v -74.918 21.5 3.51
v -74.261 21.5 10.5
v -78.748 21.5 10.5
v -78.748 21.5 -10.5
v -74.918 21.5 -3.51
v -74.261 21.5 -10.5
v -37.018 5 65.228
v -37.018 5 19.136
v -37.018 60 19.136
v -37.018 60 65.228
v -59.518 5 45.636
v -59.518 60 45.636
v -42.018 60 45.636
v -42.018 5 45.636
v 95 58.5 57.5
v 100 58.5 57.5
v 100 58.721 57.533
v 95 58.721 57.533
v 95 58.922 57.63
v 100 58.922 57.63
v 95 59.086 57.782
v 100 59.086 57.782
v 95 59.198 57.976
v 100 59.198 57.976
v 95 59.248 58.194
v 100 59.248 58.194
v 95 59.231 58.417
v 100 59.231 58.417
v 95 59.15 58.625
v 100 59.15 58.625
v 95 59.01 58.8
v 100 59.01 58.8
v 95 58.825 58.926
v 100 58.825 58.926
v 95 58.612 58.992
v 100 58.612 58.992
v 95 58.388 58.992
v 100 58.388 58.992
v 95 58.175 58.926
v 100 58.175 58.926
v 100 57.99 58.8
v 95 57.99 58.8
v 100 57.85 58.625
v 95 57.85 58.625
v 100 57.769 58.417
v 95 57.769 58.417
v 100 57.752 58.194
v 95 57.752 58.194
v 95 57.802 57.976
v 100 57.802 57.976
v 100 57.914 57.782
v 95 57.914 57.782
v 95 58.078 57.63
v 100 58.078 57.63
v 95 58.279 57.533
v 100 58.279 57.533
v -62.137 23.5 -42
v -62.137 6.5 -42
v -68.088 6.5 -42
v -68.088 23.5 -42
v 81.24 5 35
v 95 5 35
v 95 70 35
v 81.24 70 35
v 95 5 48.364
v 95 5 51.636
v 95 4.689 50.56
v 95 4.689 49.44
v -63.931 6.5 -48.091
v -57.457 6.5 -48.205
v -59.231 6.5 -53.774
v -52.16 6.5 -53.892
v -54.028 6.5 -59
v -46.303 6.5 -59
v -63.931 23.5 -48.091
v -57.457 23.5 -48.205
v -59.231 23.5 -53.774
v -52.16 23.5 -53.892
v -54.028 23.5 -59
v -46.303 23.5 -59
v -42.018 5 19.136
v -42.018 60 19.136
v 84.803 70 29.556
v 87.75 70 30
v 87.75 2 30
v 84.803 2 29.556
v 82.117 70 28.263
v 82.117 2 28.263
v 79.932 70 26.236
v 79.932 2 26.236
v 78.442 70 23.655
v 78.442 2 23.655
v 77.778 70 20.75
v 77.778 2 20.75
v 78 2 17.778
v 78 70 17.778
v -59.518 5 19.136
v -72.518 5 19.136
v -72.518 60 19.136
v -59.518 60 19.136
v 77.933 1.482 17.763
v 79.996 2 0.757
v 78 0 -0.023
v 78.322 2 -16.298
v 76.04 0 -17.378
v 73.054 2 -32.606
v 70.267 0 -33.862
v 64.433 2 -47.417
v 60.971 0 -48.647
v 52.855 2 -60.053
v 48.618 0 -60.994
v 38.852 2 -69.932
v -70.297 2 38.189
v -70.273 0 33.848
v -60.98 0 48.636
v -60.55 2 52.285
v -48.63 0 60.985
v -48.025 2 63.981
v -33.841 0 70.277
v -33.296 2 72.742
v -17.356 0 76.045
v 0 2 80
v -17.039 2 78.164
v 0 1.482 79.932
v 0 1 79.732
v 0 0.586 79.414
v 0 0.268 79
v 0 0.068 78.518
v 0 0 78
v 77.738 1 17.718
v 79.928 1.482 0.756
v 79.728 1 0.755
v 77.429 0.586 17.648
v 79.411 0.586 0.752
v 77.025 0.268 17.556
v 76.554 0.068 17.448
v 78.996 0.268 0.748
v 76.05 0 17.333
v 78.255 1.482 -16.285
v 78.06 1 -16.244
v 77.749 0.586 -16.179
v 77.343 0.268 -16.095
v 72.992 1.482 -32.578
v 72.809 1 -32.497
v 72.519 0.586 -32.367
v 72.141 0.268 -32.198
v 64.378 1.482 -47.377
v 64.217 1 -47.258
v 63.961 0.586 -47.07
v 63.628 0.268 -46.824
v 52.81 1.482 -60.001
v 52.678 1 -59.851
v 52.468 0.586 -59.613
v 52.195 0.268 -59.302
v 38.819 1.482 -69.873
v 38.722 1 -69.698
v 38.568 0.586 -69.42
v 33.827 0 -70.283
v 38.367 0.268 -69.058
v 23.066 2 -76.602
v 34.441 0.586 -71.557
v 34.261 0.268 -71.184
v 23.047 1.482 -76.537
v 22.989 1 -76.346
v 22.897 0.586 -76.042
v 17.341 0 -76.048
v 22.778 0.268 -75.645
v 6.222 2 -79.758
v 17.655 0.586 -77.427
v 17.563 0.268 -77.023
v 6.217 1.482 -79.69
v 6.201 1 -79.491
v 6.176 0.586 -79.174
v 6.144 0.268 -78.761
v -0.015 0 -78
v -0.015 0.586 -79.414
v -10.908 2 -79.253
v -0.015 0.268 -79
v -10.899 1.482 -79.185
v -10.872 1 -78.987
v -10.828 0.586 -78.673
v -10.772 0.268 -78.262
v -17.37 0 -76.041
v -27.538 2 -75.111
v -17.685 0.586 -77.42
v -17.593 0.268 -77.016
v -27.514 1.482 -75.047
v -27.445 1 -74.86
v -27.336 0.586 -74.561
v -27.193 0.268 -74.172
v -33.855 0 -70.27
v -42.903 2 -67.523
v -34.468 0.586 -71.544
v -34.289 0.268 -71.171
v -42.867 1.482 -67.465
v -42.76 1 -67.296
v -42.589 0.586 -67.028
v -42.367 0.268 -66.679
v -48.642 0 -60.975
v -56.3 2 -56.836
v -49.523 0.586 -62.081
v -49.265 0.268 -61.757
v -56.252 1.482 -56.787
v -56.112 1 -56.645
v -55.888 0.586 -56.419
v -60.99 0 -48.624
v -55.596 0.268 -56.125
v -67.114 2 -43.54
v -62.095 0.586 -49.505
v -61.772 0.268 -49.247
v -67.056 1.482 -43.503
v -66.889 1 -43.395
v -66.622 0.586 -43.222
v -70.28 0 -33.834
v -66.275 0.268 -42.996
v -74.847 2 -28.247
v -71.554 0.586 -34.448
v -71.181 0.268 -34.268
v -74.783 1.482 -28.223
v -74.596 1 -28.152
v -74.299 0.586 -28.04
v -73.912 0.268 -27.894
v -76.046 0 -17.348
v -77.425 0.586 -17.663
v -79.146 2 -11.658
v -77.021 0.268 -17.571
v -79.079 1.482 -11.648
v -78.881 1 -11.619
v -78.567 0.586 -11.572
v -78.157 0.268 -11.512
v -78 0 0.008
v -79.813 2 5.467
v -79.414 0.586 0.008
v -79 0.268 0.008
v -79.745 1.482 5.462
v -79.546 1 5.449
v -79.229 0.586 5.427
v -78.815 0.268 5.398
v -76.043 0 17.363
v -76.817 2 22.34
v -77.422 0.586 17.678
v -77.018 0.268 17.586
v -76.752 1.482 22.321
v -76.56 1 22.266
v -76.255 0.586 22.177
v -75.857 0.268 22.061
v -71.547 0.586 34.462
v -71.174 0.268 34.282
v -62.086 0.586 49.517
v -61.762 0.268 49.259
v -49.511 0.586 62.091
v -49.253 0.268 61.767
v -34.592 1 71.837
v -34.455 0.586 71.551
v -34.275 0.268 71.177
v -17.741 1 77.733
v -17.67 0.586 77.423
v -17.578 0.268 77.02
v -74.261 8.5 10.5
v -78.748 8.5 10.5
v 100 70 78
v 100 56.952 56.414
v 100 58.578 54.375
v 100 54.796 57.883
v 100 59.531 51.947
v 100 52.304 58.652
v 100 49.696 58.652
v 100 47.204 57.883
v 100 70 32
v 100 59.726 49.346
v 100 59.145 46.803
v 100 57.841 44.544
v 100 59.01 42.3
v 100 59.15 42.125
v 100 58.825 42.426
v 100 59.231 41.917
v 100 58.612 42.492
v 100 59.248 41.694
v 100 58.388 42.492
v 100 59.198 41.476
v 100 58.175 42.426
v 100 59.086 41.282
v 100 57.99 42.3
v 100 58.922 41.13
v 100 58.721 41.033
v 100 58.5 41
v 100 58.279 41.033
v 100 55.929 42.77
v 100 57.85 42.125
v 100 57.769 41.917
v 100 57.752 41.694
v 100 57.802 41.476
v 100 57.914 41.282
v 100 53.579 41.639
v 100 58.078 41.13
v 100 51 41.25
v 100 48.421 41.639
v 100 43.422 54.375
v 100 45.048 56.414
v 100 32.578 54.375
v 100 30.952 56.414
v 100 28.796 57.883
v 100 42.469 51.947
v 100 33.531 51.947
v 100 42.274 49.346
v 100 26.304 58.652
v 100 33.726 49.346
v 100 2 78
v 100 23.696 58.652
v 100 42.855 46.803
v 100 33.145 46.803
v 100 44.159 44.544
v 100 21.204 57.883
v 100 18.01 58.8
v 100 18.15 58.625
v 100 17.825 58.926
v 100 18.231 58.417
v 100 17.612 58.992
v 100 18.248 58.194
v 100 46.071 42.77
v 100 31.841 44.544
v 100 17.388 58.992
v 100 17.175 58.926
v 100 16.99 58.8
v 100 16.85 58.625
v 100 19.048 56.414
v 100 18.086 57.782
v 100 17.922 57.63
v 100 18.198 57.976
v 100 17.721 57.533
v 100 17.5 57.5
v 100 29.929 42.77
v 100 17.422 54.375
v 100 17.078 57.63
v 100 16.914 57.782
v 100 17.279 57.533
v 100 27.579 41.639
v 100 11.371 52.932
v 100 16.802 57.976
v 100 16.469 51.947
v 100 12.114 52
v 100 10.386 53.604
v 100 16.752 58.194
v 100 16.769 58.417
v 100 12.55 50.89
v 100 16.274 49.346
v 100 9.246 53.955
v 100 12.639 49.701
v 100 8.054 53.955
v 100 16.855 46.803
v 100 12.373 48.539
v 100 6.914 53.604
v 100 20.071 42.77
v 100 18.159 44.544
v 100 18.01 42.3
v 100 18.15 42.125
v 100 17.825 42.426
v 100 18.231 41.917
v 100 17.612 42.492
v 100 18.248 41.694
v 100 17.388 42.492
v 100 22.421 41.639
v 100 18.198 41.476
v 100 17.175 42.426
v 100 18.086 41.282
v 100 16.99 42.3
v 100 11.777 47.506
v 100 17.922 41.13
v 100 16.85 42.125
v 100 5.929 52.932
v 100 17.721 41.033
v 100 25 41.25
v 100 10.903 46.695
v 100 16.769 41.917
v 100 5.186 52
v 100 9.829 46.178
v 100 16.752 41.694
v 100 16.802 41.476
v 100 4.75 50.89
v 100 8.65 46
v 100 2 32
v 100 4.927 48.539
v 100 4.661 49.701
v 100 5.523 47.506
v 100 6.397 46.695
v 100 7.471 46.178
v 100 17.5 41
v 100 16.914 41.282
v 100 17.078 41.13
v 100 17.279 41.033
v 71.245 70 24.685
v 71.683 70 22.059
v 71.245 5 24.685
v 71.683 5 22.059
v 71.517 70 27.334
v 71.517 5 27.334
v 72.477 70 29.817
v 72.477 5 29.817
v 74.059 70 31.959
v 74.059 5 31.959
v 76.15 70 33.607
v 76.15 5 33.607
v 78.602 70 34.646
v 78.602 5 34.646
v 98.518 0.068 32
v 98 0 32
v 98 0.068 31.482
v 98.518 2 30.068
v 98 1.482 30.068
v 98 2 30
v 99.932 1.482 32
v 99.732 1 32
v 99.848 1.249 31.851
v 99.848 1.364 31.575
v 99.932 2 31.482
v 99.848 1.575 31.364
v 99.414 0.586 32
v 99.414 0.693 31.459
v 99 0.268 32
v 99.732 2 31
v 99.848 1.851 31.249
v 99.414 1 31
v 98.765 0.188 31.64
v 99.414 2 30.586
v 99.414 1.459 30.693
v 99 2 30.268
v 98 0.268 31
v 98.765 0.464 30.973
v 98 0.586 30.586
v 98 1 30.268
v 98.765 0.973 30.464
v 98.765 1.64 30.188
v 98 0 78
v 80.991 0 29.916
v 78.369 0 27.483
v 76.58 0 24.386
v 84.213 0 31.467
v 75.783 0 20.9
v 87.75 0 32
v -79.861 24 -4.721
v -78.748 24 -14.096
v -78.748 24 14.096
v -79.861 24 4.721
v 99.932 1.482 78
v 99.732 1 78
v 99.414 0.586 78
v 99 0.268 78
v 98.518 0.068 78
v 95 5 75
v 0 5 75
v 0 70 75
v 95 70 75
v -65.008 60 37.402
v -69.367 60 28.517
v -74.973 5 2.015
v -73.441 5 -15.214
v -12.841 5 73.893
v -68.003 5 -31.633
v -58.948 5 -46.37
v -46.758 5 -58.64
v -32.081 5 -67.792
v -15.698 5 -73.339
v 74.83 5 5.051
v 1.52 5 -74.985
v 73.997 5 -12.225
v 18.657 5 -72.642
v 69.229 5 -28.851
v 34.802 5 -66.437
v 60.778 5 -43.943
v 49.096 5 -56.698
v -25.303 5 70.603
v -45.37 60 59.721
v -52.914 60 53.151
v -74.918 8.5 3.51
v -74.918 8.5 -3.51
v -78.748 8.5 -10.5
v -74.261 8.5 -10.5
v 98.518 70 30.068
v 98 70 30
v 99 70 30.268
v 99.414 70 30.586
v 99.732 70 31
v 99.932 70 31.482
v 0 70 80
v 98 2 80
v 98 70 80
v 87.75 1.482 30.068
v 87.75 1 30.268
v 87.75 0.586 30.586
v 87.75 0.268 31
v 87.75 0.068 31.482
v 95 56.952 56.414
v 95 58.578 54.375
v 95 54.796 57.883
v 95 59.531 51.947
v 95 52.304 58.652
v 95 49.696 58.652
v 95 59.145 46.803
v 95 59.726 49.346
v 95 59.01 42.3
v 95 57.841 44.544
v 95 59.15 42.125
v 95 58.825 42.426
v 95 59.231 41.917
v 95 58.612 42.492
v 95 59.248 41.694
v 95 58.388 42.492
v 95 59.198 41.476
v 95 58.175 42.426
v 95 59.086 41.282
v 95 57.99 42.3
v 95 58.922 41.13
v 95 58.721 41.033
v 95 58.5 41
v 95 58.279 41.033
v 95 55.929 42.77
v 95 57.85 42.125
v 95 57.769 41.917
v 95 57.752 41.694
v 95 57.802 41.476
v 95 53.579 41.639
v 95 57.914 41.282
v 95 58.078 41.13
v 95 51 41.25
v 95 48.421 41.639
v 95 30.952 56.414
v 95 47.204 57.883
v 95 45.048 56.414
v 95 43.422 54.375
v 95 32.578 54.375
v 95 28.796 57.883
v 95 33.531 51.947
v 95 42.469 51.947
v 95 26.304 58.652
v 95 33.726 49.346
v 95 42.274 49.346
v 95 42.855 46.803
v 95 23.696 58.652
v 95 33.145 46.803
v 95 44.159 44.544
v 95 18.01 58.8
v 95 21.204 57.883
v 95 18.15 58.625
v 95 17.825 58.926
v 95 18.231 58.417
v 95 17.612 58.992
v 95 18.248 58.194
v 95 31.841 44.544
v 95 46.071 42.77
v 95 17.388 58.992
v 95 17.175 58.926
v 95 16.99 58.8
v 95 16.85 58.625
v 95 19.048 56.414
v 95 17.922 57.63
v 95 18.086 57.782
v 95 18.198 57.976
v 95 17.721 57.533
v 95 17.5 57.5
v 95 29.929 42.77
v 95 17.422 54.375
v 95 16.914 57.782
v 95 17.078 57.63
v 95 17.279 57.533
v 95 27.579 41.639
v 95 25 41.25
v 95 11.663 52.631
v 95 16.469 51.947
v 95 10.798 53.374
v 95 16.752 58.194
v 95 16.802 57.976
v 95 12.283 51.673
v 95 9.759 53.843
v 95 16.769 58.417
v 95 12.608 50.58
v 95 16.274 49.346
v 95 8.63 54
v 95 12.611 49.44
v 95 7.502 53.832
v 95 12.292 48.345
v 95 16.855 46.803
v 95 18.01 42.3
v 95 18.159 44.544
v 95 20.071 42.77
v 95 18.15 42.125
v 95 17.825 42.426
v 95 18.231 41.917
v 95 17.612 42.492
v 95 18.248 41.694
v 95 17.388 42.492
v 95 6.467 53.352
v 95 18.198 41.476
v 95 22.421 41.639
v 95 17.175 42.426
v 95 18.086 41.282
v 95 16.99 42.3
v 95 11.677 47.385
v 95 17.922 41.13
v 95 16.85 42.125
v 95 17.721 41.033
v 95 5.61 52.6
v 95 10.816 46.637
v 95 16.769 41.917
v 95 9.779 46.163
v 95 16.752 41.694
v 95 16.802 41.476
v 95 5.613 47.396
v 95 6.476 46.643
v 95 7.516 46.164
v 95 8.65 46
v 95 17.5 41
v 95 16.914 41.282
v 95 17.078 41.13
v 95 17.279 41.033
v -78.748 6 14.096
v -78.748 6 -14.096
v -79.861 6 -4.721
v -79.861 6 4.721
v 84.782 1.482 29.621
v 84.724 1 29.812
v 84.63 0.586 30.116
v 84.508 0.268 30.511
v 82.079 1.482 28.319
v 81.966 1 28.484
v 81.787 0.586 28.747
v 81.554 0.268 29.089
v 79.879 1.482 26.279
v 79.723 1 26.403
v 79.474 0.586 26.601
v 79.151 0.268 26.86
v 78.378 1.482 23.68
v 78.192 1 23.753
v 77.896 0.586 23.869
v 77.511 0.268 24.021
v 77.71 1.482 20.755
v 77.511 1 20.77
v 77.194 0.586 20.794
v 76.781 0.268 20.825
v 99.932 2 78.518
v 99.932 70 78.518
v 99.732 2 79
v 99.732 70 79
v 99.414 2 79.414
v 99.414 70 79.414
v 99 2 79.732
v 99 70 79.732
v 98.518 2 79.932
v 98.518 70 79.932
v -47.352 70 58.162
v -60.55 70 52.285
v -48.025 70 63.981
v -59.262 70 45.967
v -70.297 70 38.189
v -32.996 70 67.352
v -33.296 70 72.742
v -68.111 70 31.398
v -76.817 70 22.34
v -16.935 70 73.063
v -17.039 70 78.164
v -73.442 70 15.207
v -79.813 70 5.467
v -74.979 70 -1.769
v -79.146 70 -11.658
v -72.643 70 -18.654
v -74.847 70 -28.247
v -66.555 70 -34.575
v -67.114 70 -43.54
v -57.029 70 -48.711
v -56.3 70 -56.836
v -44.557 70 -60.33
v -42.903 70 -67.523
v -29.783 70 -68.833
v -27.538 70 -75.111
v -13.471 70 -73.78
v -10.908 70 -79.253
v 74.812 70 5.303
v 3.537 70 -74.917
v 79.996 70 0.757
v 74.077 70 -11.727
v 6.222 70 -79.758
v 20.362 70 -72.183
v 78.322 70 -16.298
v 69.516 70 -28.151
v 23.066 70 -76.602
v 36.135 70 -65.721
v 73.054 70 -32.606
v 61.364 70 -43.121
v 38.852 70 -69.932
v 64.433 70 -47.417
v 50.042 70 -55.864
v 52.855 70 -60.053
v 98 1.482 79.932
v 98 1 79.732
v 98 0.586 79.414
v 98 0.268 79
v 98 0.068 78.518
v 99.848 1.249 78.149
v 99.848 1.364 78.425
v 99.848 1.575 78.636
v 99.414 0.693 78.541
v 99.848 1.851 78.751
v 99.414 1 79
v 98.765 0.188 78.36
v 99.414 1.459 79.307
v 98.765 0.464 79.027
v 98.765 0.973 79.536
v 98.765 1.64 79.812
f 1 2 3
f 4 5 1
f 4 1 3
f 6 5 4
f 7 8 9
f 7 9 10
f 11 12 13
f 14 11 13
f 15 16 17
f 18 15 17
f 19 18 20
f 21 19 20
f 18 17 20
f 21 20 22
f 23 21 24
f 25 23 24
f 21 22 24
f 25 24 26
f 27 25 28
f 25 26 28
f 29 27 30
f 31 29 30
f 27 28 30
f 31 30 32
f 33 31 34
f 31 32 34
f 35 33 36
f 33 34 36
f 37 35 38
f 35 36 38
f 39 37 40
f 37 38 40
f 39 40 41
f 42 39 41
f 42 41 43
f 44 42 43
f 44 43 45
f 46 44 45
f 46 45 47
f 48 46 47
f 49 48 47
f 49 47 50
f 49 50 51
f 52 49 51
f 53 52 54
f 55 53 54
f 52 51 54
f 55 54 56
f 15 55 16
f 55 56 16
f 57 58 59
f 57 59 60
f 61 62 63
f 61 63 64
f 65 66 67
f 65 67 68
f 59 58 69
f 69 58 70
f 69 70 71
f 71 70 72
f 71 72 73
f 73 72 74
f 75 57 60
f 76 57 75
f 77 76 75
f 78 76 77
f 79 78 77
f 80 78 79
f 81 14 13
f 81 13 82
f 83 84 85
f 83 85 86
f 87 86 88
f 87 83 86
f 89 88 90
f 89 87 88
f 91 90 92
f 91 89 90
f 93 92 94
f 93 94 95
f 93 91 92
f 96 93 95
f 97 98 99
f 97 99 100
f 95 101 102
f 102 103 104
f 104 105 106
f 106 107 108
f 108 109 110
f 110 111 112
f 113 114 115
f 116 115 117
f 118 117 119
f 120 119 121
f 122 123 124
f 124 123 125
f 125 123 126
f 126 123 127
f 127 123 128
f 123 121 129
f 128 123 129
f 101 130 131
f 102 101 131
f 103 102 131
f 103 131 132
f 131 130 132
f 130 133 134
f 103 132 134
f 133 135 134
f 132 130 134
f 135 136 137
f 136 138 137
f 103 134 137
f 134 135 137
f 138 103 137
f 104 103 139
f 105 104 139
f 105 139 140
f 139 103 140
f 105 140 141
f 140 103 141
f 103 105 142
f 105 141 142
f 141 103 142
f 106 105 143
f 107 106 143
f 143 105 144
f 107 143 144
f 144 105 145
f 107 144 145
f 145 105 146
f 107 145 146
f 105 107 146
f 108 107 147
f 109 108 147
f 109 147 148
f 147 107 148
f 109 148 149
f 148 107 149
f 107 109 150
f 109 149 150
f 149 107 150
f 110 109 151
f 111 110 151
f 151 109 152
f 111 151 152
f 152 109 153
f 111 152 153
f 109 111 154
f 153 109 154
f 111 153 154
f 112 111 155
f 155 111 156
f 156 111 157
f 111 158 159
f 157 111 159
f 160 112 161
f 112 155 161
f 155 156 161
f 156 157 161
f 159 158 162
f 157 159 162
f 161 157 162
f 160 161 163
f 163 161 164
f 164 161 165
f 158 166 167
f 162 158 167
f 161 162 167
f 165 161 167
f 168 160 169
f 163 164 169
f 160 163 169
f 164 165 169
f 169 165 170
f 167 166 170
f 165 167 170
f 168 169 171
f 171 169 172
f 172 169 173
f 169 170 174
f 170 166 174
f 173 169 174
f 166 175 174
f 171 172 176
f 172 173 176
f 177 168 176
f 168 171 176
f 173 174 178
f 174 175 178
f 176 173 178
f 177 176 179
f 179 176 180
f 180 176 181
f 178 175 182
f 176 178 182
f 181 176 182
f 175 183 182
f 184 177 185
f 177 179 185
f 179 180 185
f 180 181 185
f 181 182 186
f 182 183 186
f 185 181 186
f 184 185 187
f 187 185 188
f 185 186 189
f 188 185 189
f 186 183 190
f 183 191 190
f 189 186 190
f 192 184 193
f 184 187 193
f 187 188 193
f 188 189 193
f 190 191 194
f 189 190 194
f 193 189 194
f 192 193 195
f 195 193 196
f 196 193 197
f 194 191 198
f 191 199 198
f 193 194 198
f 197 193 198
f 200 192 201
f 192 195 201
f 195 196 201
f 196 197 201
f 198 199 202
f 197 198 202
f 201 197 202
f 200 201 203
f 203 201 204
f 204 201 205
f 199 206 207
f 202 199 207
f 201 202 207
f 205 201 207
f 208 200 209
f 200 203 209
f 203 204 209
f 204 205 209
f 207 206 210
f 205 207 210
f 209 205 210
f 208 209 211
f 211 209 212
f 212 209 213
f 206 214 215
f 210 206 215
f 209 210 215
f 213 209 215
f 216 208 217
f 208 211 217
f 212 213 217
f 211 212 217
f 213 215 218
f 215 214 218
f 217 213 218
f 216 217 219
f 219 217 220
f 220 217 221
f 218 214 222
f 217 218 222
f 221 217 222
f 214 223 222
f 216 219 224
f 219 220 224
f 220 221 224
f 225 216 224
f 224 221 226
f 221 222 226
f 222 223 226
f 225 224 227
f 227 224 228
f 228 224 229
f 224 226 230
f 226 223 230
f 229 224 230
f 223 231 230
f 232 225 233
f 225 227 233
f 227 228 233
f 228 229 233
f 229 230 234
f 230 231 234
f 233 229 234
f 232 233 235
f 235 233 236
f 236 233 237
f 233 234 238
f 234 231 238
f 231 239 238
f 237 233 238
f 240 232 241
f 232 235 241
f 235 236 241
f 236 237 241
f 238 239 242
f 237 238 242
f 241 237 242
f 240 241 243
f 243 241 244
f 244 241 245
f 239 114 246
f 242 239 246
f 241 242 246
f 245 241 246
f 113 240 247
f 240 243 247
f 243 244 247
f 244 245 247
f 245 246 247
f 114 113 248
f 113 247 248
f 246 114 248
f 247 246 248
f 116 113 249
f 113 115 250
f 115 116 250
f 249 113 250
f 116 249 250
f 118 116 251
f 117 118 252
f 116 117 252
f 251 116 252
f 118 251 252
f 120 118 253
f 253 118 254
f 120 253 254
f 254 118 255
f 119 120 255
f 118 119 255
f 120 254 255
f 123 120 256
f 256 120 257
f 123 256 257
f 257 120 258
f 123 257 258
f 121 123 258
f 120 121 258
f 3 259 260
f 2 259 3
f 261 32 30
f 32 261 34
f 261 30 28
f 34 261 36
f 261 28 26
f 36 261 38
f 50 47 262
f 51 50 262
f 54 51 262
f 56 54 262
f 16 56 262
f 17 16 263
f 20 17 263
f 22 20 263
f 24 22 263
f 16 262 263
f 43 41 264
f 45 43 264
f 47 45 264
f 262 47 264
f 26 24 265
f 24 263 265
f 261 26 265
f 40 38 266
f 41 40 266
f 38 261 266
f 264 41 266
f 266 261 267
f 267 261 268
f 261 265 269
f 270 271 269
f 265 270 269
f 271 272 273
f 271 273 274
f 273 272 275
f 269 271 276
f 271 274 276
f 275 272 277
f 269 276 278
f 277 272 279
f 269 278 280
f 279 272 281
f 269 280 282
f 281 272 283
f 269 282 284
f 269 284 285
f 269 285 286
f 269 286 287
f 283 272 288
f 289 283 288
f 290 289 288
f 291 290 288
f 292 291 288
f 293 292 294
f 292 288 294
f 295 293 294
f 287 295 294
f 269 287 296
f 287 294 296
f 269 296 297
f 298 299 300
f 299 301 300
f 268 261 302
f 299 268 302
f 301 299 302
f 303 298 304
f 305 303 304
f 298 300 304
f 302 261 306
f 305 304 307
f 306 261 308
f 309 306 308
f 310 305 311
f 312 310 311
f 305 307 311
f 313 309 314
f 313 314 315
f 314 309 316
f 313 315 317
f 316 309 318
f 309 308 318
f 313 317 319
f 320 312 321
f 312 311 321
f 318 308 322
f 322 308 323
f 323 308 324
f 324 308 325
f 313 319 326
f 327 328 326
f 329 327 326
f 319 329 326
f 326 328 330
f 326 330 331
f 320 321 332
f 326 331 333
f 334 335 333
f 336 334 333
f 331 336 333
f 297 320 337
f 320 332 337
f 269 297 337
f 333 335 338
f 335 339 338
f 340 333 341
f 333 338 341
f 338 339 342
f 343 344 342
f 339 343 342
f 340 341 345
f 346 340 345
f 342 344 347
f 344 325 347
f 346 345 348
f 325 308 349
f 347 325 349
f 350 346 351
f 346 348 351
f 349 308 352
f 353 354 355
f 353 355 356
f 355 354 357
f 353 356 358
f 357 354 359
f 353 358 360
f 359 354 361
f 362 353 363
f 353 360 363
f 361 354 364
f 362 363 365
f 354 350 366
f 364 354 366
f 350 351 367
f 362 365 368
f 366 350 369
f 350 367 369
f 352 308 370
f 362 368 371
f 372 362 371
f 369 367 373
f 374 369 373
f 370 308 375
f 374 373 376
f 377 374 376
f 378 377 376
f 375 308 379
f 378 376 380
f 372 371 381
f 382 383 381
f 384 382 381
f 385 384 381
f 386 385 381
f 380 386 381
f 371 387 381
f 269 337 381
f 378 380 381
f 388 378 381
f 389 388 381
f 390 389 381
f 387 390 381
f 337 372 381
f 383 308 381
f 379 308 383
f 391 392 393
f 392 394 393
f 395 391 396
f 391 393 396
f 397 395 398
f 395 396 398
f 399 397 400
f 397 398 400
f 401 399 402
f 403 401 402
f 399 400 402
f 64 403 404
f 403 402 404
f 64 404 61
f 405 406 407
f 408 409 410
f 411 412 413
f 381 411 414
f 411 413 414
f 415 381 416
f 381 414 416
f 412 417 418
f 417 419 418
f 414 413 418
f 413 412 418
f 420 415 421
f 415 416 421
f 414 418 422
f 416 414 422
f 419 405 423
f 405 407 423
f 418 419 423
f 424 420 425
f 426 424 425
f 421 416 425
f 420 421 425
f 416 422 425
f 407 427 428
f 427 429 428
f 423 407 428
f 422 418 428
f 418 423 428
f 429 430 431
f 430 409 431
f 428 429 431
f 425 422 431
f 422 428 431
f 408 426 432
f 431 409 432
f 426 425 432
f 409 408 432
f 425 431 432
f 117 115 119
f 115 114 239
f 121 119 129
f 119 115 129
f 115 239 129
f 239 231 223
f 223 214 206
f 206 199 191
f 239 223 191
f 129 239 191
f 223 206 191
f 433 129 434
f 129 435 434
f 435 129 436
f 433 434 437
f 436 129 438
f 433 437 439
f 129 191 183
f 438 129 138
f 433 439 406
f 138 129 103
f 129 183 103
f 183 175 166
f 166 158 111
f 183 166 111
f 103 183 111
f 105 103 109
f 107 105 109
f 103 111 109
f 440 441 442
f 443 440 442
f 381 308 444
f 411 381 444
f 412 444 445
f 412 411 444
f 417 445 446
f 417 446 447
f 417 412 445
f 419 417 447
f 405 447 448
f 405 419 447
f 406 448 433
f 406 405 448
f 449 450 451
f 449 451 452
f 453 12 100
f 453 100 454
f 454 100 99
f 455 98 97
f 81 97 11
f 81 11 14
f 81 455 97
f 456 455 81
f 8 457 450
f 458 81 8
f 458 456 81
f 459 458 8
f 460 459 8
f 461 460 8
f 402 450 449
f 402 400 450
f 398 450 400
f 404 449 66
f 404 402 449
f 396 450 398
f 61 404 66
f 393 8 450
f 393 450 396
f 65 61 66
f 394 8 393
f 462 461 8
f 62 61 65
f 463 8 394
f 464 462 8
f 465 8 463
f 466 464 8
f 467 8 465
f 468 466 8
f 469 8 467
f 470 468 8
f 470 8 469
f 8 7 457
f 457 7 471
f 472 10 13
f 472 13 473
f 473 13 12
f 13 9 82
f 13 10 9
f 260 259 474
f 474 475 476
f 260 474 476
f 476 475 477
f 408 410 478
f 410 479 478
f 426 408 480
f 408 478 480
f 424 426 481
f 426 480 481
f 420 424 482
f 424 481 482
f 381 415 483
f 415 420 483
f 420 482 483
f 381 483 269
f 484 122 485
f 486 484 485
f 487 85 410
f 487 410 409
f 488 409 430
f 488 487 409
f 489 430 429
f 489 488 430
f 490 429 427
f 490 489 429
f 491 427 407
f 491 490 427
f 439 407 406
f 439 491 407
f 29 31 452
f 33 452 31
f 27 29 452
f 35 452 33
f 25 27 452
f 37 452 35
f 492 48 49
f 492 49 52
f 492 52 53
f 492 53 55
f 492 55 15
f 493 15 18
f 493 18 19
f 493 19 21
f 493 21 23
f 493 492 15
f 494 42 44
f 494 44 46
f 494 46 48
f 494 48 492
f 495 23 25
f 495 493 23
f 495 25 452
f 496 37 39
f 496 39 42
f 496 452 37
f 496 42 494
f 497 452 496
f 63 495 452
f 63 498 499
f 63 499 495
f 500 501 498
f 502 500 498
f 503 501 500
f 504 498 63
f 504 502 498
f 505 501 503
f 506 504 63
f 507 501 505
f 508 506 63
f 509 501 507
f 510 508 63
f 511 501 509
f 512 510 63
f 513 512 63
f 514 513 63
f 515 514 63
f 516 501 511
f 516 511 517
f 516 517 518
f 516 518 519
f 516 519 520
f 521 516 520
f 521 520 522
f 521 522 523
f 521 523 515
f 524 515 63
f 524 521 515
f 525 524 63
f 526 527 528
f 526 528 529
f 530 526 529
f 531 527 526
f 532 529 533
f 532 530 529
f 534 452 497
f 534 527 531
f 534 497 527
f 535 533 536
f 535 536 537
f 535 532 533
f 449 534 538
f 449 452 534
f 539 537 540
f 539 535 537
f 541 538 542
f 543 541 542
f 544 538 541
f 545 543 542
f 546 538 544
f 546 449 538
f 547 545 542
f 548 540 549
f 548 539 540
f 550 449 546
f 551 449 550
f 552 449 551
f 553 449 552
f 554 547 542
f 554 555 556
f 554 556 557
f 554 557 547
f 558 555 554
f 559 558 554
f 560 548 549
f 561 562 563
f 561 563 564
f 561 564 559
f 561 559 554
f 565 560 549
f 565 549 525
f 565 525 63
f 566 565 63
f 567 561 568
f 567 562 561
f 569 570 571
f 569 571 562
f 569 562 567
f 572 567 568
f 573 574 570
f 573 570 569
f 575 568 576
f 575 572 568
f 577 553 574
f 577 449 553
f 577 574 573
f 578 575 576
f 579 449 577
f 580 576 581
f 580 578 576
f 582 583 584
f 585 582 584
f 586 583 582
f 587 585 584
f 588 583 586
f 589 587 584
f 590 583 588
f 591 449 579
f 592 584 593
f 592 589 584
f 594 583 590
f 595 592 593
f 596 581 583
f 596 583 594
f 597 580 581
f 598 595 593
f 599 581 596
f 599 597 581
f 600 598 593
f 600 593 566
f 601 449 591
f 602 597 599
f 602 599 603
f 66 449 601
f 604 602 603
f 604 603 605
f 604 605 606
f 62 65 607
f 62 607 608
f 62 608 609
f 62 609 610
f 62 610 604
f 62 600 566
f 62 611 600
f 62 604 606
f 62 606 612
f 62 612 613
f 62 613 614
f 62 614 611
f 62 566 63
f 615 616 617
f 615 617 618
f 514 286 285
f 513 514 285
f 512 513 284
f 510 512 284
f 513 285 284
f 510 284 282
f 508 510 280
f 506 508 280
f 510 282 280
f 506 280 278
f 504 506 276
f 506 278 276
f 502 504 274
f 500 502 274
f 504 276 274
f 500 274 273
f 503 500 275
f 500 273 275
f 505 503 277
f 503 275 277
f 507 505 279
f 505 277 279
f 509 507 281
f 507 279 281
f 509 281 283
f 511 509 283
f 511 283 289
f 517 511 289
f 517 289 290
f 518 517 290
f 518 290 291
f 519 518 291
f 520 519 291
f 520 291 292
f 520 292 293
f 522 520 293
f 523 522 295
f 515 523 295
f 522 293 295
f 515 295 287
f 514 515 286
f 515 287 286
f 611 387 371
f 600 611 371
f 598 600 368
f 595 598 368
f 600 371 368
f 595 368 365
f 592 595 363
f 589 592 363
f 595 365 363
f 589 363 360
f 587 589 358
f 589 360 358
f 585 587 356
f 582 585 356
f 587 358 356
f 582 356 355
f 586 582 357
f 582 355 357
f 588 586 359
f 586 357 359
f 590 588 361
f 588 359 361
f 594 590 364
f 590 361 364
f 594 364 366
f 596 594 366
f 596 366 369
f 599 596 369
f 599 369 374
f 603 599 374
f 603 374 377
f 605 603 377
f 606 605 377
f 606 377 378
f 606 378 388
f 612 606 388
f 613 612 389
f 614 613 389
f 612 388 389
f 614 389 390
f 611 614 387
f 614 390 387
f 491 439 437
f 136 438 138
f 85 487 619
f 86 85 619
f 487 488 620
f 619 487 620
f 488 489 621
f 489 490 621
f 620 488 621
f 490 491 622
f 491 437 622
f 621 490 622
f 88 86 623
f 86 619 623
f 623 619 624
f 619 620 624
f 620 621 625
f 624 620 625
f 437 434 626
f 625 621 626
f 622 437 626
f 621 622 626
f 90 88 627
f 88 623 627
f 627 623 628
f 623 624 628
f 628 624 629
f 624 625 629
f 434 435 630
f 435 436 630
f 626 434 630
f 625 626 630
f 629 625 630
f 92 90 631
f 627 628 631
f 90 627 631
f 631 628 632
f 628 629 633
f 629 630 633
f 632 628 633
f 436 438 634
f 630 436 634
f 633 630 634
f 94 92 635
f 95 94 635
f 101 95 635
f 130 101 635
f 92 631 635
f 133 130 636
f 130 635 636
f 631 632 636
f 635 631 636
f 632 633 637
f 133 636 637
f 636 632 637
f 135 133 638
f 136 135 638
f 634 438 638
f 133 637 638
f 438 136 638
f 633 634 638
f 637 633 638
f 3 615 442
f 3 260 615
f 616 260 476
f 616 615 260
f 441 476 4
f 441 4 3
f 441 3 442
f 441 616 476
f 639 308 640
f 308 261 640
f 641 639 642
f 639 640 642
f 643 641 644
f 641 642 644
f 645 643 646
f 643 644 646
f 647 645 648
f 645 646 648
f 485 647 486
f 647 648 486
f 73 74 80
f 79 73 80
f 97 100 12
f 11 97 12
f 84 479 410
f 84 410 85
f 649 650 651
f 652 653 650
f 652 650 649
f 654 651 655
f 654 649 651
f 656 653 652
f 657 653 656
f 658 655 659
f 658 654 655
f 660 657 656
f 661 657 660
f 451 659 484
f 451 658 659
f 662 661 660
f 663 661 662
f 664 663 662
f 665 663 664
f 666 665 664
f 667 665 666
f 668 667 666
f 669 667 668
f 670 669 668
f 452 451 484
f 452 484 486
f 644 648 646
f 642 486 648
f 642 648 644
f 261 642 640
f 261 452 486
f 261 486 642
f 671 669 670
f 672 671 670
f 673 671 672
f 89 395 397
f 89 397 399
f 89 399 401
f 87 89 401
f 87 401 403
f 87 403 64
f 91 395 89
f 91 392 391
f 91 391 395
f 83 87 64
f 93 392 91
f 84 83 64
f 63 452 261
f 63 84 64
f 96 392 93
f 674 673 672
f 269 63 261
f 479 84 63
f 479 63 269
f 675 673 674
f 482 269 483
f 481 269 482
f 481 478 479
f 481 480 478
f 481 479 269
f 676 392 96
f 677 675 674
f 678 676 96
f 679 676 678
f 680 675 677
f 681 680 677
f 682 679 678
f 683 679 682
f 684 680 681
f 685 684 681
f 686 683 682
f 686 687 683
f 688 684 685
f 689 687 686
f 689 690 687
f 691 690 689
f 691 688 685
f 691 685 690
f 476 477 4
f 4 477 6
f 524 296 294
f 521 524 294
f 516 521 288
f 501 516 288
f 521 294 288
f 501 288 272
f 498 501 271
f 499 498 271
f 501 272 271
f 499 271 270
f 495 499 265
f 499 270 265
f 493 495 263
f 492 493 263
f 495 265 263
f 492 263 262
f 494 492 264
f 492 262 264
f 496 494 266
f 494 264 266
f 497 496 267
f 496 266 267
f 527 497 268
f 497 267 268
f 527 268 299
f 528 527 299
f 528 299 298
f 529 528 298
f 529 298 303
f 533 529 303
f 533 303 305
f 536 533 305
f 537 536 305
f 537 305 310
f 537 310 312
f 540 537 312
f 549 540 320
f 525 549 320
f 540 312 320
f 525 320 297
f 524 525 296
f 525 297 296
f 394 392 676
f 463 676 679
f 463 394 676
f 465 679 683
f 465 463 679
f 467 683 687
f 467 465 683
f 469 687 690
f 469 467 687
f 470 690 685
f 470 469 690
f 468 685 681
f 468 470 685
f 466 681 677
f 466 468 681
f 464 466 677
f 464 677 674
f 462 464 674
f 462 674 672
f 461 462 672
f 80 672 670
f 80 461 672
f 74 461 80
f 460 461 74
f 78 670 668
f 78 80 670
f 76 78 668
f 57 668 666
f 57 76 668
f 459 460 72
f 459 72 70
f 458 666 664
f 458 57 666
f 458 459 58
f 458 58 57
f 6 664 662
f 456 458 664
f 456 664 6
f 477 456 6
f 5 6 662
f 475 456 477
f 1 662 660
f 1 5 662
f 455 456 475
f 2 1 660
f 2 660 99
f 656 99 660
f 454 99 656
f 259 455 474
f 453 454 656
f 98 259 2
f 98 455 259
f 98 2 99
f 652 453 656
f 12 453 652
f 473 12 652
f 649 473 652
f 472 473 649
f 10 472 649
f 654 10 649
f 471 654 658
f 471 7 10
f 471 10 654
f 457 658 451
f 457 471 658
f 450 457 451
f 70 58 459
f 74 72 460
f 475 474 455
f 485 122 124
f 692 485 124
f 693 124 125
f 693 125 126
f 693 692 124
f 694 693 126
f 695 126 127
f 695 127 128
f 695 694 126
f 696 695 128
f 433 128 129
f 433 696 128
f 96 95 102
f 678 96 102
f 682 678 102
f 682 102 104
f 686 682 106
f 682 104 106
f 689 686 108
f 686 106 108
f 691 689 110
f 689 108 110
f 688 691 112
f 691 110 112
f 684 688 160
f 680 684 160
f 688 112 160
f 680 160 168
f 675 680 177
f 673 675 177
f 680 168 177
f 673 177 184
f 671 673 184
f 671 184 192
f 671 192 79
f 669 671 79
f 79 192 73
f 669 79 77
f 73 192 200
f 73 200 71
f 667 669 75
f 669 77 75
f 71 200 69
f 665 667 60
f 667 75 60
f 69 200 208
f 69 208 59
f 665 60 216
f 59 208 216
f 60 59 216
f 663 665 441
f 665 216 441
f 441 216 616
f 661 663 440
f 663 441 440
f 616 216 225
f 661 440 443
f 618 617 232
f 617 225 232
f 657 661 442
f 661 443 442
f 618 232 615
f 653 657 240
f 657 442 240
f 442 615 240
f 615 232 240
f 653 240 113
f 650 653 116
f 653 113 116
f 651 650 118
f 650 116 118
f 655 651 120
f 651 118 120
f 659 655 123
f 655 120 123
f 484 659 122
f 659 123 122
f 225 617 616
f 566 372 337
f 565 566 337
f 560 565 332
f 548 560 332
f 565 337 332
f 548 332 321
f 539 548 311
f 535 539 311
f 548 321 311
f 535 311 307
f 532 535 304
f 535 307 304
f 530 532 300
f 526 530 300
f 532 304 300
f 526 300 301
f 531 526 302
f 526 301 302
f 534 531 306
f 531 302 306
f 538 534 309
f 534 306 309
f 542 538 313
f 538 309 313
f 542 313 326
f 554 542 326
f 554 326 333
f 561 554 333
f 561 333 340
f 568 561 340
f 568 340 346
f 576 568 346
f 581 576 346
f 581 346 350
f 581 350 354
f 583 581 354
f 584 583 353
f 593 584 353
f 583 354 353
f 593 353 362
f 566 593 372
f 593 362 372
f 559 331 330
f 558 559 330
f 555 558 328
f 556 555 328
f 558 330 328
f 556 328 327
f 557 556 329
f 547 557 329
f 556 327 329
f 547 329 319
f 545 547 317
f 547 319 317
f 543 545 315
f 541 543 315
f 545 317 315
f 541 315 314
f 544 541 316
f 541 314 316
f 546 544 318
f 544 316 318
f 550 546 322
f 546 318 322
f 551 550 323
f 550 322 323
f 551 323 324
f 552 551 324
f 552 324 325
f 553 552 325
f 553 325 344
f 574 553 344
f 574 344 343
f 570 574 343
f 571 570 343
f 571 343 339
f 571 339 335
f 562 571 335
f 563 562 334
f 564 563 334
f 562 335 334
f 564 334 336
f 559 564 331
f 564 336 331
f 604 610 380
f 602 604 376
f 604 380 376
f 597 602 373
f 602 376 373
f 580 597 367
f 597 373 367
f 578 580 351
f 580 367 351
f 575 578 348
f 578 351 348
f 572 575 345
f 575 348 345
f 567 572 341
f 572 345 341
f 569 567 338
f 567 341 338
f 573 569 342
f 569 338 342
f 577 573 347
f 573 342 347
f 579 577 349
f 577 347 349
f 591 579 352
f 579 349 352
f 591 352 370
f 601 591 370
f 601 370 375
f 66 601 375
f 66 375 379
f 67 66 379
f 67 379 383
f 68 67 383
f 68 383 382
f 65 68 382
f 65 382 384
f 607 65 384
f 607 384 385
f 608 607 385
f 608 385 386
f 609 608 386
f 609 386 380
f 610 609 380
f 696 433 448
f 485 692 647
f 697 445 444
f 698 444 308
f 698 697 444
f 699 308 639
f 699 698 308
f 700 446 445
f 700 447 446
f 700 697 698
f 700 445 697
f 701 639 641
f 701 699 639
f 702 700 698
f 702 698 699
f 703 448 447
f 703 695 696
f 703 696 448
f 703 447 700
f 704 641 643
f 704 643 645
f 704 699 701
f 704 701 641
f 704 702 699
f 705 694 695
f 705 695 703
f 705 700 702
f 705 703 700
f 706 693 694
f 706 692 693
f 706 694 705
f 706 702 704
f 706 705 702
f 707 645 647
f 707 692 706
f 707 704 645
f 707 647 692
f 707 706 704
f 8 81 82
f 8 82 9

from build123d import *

# Parameters (mm, degrees)
BOSS_EXTRUDE1_DEPTH     = 70
SHELL1_T                = -5
SKETCH3_R               = 8.75
SKETCH3_R_2             = 0.75
SKETCH3_R_3             = 4
CUT_EXTRUDE1_DEPTH      = 5
CUT_EXTRUDE2_REACH      = 147.945
CUT_EXTRUDE2_END_RADIUS = 80
SKETCH4_W               = 17
SKETCH4_H               = 17
SKETCH4_W_2             = 21
SKETCH4_H_2             = 13
CUT_EXTRUDE3_DEPTH      = 146.945195193
CUT_EXTRUDE3_DEPTH_BACK = 146.945195193
SKETCH5_W               = 2.5
SKETCH5_H               = 18
BOSS_EXTRUDE3_DEPTH     = 55
FILLET1_R               = 10
FILLET2_R               = 2


with BuildPart() as part:
    # Sketch1 → Boss-Extrude1 (new body)
    with BuildSketch(Plane(origin=(0, 0, 0), x_dir=(1, 0, 0), z_dir=(0, 1, 0))):
        with BuildLine():
            Line((0, -80), (100, -80))
            Line((100, -80), (100, -30))
            Line((100, -30), (74.161984871, -30))
            ThreePointArc((74.161984871, -30), (-44.72135955, 66.332495807), (0, -80))
        make_face()
    extrude(amount=BOSS_EXTRUDE1_DEPTH)

    # Shell1
    shell1_openings = [part.faces().sort_by_distance(p)[0] for p in [
        (7.618956149, 70, 6.200850369),
    ]]
    offset(amount=SHELL1_T, openings=shell1_openings, kind=Kind.INTERSECTION)

    # Sketch3 → Cut-Extrude1 (cut)
    with BuildSketch(Plane(origin=(100, 0, 0), x_dir=(0, 0, -1), z_dir=(1, 0, 0))):
        with Locations((-50, 25)):
            Circle(SKETCH3_R)
        with Locations((-50, 51)):
            Circle(SKETCH3_R)
        with Locations((-41.75, 58.5)):
            Circle(SKETCH3_R_2)
        with Locations((-41.75, 17.5)):
            Circle(SKETCH3_R_2)
        with Locations((-58.25, 17.5)):
            Circle(SKETCH3_R_2)
        with Locations((-58.25, 58.5)):
            Circle(SKETCH3_R_2)
        with Locations((-50, 8.65)):
            Circle(SKETCH3_R_3)
    extrude(amount=-CUT_EXTRUDE1_DEPTH, mode=Mode.SUBTRACT)

    # Cut-Extrude2: up to this cylinder (the profile starts inside it)
    cut_extrude2_end = Plane(origin=(0, 15, 0), z_dir=(0, -1, 0)) * Cylinder(CUT_EXTRUDE2_END_RADIUS, 456.89, mode=Mode.PRIVATE)
    # Sketch4 → Cut-Extrude2 (cut, up to the surface)
    with BuildSketch(Plane(origin=(0, 0, 0), x_dir=(0, 0, -1), z_dir=(1, 0, 0)), mode=Mode.PRIVATE) as cut_extrude2_sk1:
        with Locations((50.5, 15)):
            Rectangle(SKETCH4_W, SKETCH4_H)
    cut_extrude2_tool1 = extrude(cut_extrude2_sk1.sketch, amount=-CUT_EXTRUDE2_REACH, mode=Mode.PRIVATE) & cut_extrude2_end
    add(cut_extrude2_tool1.solids().sort_by_distance((0, 15, -50.5))[0], mode=Mode.SUBTRACT)
    # Sketch4 → Cut-Extrude2 (cut, up to the surface)
    with BuildSketch(Plane(origin=(0, 0, 0), x_dir=(0, 0, -1), z_dir=(1, 0, 0)), mode=Mode.PRIVATE) as cut_extrude2_sk2:
        with Locations((0, 15)):
            Rectangle(SKETCH4_W_2, SKETCH4_H_2)
    cut_extrude2_tool2 = extrude(cut_extrude2_sk2.sketch, amount=-CUT_EXTRUDE2_REACH, mode=Mode.PRIVATE) & cut_extrude2_end
    add(cut_extrude2_tool2.solids().sort_by_distance((0, 15, 0))[0], mode=Mode.SUBTRACT)

    # Sketch5 → Cut-Extrude3 (cut, two sides: drawn at the far end of the back side and taken through both)
    with BuildSketch(Plane.XY.offset(-CUT_EXTRUDE3_DEPTH_BACK)):
        with Locations((-79.998342826, 15)):
            Rectangle(SKETCH5_W, SKETCH5_H)
    extrude(amount=CUT_EXTRUDE3_DEPTH + CUT_EXTRUDE3_DEPTH_BACK, mode=Mode.SUBTRACT)

    # Sketch6 → Boss-Extrude3 (add)
    with BuildSketch(Plane(origin=(0, 5, 0), x_dir=(1, 0, 0), z_dir=(0, 1, 0))):
        with BuildLine():
            Line((-72.5176701, -19.136026841), (-59.5176701, -19.136026841))
            Line((-59.5176701, -19.136026841), (-59.5176701, -45.636026841))
            Line((-59.5176701, -45.636026841), (-42.0176701, -45.636026841))
            Line((-42.0176701, -45.636026841), (-42.0176701, -19.136026841))
            Line((-42.0176701, -19.136026841), (-37.0176701, -19.136026841))
            Line((-37.0176701, -19.136026841), (-37.0176701, -65.228000892))
            Line((-37.0176701, -65.228000892), (-37.0176701, -67.228000892))
            ThreePointArc((-37.0176701, -67.228000892), (-61.280154536, -47.480406071), (-74.5176701, -19.136026841))
            Line((-74.5176701, -19.136026841), (-72.5176701, -19.136026841))
        make_face()
    extrude(amount=BOSS_EXTRUDE3_DEPTH)

    # Fillet1
    fillet1_edges = [part.edges().sort_by_distance(p)[0] for p in [
        (66.332495807, 37.5, 35),
        (74.161984871, 35, 30),
    ]]
    fillet(fillet1_edges, radius=FILLET1_R)

    # Fillet2
    fillet2_edges = [part.edges().sort_by_distance(p)[0] for p in [
        (-49.888765157, 0, -62.538876798),
        (79.932284274, 0, 26.236095645),
        (93.874821937, 0, 30),
        (100, 0, 55),
        (50, 0, 80),
        (100, 35, 30),
        (100, 35, 80),
    ]]
    fillet(fillet2_edges, radius=FILLET2_R)


solid = part.part
